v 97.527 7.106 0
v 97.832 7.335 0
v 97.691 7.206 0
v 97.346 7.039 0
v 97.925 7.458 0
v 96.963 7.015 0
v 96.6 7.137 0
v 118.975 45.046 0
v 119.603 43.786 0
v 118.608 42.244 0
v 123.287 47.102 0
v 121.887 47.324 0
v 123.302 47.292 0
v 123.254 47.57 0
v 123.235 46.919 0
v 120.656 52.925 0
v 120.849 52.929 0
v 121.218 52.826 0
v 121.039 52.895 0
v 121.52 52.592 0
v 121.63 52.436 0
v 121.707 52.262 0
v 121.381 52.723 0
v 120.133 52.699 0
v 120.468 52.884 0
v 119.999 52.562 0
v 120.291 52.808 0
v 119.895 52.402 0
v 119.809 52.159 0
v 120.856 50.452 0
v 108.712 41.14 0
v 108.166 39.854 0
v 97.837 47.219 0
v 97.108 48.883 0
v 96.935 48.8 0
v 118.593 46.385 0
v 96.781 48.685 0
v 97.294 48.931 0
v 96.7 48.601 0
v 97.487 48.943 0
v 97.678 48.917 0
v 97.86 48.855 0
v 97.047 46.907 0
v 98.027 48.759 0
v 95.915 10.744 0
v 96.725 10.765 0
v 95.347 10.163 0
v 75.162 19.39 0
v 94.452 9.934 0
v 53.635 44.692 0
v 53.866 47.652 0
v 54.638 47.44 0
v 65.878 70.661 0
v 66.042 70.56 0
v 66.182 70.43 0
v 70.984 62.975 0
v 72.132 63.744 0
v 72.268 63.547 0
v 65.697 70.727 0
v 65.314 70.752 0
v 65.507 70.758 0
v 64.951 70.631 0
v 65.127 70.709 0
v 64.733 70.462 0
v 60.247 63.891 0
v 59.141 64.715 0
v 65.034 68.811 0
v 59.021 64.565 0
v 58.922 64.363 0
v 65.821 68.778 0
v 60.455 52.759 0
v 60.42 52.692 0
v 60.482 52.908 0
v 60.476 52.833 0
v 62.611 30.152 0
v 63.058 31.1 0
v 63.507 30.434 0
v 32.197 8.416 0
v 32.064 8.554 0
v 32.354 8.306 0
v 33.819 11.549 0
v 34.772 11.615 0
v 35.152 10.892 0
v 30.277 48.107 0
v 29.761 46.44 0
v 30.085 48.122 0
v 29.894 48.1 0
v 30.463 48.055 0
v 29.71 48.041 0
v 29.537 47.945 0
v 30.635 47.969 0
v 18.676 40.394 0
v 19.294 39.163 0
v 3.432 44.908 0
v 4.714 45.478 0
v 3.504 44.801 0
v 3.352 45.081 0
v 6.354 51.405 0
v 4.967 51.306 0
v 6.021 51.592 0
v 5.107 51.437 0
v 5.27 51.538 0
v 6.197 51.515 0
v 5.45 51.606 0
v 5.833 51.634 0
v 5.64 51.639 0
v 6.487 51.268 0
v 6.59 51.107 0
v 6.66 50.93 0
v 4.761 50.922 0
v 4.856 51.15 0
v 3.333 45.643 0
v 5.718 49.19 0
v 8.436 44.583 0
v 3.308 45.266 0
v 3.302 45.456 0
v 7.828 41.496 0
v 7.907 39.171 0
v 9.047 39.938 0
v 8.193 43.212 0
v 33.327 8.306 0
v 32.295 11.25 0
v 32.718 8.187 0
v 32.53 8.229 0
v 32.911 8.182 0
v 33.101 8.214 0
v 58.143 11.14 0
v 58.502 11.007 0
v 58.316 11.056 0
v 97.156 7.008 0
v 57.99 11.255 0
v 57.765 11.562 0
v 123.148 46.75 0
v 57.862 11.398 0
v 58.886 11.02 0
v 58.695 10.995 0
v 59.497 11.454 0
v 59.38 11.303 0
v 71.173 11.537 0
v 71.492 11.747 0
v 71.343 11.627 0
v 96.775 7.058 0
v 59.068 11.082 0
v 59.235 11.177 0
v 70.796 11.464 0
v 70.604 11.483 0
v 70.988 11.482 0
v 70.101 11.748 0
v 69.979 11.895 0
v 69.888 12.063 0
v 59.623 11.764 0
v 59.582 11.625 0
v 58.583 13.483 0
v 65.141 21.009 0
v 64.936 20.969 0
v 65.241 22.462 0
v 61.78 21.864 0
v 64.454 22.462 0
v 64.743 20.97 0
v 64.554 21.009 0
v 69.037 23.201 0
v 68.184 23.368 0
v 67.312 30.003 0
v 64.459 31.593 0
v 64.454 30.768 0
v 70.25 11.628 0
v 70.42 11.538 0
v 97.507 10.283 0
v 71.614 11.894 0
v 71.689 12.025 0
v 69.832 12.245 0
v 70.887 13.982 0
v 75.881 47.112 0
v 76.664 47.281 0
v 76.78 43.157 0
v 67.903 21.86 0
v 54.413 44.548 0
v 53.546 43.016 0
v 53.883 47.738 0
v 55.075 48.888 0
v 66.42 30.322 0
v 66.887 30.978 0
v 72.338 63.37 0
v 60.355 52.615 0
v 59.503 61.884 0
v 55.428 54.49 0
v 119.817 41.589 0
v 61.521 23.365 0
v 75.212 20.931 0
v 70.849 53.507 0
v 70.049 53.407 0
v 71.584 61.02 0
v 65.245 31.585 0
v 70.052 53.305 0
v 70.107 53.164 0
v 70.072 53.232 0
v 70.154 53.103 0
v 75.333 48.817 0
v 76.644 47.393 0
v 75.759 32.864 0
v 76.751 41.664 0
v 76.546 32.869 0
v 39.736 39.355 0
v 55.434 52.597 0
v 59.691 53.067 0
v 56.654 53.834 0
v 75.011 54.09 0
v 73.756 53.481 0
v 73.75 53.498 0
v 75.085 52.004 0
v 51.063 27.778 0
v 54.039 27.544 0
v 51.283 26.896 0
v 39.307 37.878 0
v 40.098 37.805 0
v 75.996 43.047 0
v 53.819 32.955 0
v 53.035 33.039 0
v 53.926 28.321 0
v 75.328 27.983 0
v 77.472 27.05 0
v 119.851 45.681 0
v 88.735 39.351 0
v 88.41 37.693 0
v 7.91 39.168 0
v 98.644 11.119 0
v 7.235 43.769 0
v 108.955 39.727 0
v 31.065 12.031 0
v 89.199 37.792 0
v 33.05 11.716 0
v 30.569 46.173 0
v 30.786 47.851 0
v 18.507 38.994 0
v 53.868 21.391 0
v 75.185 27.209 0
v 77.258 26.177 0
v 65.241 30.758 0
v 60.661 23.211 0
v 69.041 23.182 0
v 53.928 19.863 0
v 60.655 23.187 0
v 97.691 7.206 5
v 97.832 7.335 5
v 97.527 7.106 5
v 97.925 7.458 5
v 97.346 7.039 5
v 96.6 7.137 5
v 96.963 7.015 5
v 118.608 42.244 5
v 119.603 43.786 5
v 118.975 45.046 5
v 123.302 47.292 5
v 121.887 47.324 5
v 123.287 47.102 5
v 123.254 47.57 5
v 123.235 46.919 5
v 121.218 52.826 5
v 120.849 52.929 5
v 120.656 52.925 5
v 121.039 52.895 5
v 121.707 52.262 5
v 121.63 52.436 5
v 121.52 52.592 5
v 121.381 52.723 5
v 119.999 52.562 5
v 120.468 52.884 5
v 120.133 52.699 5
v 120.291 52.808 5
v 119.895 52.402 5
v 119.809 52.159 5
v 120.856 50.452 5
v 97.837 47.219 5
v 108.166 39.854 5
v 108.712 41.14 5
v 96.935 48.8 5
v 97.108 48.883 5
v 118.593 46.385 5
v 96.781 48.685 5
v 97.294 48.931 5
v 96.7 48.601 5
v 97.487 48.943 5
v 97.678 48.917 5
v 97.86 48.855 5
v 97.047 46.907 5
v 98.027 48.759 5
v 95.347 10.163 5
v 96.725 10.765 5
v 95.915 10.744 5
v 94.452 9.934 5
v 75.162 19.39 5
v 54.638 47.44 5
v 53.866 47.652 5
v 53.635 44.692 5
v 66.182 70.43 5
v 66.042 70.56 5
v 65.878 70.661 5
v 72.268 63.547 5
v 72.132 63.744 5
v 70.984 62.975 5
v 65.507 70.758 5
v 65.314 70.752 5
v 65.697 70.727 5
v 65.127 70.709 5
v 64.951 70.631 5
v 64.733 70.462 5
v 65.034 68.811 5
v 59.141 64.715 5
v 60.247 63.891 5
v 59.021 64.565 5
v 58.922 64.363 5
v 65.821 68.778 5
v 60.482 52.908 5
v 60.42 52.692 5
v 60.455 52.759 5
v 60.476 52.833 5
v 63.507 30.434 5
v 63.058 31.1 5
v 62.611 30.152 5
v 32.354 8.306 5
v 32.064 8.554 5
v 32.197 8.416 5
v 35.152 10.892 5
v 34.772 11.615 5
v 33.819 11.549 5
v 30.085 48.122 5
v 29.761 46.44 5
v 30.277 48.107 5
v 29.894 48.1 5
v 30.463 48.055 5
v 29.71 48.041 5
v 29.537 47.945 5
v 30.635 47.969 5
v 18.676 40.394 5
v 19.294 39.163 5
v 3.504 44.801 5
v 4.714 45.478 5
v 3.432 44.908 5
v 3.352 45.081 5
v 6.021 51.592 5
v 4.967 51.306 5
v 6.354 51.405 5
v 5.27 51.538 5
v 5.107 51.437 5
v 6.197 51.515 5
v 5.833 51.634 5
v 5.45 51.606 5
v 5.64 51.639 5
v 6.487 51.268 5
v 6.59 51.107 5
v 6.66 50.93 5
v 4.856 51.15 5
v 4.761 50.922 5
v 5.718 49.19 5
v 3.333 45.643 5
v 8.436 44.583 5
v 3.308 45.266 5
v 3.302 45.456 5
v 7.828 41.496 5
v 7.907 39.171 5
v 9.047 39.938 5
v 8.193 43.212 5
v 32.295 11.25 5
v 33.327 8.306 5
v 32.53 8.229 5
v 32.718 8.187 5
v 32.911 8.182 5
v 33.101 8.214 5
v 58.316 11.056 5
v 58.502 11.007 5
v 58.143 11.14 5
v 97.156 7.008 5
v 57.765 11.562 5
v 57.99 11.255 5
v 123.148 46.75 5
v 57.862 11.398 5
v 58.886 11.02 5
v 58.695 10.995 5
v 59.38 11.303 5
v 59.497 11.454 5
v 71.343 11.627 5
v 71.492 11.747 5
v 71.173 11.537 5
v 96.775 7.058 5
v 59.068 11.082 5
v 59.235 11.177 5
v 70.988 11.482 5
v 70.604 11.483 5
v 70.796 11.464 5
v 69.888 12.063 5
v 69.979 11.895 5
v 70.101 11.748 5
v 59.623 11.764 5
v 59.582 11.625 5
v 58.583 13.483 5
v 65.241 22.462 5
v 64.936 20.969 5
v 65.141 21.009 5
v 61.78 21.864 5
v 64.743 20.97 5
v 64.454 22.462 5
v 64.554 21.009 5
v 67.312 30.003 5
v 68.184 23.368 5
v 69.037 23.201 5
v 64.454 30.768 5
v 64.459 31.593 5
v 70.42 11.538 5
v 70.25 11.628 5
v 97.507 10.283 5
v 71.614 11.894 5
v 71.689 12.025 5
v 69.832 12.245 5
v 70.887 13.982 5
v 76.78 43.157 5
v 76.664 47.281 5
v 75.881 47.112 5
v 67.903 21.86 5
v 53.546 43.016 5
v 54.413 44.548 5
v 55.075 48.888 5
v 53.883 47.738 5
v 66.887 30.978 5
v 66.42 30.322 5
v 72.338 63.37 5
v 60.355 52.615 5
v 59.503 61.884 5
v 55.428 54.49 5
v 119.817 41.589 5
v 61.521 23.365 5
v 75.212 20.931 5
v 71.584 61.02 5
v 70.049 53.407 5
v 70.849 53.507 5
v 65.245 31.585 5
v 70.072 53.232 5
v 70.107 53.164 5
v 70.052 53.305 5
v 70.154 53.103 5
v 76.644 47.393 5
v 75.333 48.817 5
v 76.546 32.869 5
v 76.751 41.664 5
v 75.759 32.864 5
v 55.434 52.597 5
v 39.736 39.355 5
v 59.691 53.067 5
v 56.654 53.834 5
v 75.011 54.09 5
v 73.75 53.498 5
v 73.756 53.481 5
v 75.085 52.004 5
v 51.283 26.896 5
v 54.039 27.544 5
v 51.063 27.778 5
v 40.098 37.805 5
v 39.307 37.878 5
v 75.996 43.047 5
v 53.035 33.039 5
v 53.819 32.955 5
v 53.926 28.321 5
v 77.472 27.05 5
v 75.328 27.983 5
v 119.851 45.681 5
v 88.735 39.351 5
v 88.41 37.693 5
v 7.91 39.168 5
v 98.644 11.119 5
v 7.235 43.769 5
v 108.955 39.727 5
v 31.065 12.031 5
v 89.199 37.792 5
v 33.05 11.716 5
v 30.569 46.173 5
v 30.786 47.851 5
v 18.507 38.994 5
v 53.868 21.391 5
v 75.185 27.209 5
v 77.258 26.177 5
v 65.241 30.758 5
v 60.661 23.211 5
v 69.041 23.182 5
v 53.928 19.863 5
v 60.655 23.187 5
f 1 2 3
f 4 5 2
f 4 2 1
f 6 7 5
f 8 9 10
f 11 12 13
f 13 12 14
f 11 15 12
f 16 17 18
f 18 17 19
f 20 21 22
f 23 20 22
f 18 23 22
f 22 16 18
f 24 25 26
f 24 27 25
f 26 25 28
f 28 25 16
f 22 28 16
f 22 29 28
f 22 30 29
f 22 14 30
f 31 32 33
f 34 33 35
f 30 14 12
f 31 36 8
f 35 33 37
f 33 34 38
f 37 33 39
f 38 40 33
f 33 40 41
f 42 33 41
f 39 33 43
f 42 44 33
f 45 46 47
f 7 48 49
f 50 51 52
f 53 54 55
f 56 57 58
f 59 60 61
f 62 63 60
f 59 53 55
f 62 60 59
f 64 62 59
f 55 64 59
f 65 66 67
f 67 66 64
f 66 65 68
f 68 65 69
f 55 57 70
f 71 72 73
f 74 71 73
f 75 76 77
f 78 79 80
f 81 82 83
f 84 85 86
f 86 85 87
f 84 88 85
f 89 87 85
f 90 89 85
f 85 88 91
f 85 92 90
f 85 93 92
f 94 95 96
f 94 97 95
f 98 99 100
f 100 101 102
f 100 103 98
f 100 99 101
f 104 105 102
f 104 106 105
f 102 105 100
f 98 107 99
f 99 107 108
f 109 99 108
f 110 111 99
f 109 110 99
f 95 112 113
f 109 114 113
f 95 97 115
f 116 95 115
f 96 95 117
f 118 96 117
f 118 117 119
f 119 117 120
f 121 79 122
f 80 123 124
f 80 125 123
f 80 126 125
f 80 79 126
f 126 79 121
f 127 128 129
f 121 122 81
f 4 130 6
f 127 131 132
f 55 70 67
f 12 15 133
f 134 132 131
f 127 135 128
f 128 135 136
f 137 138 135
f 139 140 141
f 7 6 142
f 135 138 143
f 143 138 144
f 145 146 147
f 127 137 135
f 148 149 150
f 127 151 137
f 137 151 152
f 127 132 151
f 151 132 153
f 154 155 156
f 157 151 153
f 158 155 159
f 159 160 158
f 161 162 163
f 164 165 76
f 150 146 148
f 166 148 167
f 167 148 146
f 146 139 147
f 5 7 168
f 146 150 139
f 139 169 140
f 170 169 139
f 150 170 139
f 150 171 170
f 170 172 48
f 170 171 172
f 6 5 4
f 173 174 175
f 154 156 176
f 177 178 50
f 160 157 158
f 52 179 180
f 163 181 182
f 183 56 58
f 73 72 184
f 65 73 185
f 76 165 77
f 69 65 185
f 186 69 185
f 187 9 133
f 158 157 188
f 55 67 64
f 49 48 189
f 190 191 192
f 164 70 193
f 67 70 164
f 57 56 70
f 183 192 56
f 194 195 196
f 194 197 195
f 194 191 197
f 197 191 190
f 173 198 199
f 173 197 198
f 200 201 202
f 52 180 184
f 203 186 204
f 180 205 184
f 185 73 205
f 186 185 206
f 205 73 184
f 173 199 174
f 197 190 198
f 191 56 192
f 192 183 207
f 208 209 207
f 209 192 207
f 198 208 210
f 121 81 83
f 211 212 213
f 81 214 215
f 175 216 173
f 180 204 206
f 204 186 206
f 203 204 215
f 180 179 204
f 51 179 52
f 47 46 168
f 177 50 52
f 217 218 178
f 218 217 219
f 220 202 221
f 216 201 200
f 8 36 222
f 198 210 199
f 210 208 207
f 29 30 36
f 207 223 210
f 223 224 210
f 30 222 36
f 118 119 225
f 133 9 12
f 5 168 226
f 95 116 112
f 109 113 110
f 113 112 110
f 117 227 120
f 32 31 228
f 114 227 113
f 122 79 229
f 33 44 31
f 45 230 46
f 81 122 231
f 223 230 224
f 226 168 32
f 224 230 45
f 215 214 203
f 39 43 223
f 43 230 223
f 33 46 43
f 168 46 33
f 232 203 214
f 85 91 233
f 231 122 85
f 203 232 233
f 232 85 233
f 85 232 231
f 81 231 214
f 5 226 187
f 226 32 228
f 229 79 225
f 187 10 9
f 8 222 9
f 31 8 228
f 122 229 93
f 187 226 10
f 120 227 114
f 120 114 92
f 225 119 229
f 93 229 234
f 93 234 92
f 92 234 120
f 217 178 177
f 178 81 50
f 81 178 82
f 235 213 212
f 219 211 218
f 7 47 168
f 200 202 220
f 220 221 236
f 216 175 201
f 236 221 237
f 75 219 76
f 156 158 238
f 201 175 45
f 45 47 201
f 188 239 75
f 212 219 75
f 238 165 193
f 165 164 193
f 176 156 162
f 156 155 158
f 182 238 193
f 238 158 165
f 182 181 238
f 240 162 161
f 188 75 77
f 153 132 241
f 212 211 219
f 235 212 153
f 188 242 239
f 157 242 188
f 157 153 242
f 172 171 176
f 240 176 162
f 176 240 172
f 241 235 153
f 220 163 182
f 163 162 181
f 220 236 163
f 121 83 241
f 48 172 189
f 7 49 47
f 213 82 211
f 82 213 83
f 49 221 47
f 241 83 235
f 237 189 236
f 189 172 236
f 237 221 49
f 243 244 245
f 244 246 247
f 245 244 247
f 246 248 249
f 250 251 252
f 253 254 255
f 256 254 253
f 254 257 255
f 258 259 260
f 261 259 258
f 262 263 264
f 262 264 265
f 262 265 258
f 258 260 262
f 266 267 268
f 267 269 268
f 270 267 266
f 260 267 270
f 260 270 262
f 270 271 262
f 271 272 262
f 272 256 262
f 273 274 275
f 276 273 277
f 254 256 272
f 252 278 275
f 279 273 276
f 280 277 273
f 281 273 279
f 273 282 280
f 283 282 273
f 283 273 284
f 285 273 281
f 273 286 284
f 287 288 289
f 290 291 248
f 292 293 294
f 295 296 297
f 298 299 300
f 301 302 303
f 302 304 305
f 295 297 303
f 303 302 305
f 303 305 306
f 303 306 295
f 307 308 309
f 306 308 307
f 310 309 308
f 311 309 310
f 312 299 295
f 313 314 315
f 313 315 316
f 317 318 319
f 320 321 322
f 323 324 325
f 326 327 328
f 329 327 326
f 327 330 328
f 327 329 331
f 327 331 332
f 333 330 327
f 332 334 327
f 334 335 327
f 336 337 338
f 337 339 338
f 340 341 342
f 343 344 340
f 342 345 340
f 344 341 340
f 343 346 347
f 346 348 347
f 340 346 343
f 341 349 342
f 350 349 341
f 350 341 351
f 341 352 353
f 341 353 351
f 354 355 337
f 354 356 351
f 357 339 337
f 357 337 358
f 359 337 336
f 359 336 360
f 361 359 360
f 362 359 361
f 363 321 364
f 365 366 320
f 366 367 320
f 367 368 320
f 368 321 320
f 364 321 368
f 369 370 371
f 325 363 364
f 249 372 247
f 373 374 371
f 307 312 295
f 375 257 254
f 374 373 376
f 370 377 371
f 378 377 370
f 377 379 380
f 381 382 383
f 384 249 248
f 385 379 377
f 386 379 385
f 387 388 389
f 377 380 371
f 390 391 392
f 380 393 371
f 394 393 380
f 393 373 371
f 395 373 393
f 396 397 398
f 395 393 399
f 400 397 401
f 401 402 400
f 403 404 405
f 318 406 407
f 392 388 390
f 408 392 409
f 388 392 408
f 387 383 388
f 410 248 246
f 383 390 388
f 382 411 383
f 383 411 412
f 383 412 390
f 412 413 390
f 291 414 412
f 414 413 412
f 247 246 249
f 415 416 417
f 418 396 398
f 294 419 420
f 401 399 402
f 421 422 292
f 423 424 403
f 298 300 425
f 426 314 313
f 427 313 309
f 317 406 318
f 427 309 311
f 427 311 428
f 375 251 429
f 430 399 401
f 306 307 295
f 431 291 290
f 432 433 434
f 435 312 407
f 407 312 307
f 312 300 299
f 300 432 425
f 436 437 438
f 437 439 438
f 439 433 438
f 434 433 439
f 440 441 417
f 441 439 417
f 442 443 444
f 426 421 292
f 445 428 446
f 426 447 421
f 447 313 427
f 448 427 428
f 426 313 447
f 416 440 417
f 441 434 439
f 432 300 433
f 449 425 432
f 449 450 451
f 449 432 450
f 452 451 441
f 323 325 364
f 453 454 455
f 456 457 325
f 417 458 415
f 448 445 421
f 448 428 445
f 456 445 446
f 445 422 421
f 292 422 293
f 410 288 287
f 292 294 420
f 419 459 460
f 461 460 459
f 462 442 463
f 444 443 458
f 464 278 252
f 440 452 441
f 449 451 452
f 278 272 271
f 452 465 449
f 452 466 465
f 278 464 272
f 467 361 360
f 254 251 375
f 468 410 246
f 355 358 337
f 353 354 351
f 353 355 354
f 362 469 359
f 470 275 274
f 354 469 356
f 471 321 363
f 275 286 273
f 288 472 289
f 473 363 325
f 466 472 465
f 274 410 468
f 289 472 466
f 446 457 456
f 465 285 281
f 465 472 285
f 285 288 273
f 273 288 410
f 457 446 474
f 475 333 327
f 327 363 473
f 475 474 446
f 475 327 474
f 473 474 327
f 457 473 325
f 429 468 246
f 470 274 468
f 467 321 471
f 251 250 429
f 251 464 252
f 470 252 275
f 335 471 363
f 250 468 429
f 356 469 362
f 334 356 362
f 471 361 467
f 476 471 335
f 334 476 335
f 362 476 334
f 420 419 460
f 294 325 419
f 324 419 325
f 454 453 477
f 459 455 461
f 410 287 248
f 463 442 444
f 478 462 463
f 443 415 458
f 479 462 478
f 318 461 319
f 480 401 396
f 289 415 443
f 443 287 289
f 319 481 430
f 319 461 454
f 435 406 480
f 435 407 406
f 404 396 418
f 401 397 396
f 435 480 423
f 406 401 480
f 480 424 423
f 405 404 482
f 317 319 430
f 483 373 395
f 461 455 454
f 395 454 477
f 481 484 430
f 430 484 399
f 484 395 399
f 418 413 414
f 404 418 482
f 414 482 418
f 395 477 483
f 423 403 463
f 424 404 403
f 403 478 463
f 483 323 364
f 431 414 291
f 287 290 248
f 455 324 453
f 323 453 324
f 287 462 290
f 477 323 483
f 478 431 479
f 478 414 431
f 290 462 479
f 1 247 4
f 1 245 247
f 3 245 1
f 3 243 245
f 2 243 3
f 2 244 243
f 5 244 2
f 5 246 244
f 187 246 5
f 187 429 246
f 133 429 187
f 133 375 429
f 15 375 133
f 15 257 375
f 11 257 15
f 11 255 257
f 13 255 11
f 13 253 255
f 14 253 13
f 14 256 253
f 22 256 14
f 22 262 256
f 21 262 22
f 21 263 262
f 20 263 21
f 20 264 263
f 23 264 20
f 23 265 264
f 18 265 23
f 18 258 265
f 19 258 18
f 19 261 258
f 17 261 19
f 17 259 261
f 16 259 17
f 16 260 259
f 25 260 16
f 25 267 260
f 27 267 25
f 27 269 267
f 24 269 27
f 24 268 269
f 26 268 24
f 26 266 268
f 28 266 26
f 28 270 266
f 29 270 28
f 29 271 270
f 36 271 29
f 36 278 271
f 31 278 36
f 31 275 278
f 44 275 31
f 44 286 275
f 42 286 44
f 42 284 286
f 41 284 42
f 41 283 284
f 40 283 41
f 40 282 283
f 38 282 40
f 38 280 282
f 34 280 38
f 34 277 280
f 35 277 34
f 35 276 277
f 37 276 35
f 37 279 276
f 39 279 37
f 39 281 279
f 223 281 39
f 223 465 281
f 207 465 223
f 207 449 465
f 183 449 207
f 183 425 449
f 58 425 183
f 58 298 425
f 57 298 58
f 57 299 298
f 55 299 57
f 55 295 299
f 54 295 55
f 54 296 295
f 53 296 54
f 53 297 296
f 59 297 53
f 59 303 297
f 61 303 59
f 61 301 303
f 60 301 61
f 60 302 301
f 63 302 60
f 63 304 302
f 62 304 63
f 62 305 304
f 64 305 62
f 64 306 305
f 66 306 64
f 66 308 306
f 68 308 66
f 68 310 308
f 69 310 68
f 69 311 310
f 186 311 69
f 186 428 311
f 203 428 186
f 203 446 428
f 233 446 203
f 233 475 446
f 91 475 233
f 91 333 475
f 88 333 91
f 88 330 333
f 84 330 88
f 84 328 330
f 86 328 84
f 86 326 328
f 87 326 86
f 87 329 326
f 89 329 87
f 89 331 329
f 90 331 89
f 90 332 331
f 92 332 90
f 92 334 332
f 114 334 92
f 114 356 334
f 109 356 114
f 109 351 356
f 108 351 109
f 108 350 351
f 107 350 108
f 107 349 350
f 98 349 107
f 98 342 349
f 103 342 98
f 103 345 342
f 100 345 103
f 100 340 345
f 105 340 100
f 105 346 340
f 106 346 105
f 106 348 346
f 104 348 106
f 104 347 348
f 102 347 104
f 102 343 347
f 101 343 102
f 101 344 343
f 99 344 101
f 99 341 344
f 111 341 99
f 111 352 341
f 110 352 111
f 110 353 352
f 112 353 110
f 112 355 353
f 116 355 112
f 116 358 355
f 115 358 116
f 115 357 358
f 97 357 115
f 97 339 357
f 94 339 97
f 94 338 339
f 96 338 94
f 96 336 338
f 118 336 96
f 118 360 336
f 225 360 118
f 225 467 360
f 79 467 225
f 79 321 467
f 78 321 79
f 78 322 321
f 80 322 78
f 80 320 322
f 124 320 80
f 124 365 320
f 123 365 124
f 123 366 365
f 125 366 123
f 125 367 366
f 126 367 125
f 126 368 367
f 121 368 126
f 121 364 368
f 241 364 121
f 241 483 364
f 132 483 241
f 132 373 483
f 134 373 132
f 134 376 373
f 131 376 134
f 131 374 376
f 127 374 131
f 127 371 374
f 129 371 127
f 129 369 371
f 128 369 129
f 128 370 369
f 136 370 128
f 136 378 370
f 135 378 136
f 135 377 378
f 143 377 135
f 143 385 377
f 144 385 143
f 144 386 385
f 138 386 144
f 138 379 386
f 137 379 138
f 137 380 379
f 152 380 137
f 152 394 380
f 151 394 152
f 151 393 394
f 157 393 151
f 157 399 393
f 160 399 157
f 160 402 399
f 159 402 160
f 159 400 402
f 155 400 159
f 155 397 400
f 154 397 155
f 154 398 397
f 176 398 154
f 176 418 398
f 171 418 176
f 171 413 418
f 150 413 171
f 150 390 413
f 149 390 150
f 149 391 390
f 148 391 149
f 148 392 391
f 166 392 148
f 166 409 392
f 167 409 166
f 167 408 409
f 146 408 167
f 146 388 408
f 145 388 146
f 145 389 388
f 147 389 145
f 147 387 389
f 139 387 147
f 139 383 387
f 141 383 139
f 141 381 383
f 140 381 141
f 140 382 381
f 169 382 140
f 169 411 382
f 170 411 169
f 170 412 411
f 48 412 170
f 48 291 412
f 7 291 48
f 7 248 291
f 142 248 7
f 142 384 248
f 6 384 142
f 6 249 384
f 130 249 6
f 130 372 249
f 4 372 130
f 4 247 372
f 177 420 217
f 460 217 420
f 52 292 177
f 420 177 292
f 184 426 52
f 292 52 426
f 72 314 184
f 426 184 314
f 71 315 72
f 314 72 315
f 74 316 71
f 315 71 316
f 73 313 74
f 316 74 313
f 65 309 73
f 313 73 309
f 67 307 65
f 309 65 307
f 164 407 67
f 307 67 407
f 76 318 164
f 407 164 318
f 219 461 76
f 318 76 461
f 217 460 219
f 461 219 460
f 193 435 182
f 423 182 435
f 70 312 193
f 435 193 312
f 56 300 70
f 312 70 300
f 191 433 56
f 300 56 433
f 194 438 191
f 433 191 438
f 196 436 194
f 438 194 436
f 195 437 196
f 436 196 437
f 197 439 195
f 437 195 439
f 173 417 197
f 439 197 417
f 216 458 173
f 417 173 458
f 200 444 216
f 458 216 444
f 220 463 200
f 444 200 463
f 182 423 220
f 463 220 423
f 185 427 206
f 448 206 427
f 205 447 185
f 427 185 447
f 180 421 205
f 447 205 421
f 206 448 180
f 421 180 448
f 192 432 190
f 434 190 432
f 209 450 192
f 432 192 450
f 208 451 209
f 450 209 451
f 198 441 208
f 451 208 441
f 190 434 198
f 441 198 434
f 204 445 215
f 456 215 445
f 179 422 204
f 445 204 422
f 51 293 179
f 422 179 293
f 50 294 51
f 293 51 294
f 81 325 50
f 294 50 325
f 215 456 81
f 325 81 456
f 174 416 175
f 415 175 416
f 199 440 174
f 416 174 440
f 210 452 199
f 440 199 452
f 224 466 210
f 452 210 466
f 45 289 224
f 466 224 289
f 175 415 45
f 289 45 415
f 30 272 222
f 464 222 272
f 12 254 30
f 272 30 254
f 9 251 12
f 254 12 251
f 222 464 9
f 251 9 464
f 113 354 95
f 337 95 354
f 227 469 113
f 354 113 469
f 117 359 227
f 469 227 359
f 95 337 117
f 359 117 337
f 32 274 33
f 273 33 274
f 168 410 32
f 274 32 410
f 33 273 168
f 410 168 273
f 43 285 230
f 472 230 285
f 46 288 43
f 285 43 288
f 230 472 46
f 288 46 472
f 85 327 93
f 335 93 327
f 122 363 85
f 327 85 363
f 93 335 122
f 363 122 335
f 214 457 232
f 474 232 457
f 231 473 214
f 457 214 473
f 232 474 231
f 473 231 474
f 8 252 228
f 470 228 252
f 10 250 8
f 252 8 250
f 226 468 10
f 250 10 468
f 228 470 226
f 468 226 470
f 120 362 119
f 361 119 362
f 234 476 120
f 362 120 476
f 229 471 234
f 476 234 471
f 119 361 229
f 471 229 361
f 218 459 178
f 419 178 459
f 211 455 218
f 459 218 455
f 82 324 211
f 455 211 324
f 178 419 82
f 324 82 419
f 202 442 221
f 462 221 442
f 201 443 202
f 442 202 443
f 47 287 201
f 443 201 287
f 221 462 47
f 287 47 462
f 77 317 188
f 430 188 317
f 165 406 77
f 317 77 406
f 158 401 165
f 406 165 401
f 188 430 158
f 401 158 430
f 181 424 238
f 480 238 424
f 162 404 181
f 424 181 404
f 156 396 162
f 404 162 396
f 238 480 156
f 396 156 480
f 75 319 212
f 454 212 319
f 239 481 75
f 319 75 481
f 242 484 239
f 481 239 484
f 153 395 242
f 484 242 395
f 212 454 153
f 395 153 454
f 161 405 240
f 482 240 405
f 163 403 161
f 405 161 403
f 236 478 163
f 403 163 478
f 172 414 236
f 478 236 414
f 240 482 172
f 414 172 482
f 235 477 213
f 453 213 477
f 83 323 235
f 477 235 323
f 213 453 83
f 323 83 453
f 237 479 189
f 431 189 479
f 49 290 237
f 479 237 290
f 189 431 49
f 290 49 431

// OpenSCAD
/*
 * Customizable Origami - Bat - https://www.thingiverse.com/thing:2686150
 * by Dennis Hofmann - https://www.thingiverse.com/mightynozzle/about
 * created 2017-12-03
 * version v1.0
 *
 * Changelog
 * --------------
 * v1.0:
 *      - final design
 * --------------
 * 
 * This work is licensed under the Creative Commons - Attribution - NonCommercial - ShareAlike license.
 * https://creativecommons.org/licenses/by-nc-sa/3.0/
 */


 // Parameter Section //
//-------------------//

// preview[view:north, tilt:top]

// The maximum size of the longest side. The shorter side will be automatically resized in same ratio.
max_size_in_millimeter = 120; //[20:300]

// The height of the model.
model_height_in_millimeter = 5; //[0.2:0.2:100]

// Thickness of the outer outline.
outline_size_in_millimeter = 1.4; //[0.5:0.1:20]

// Thickness of the inner outline.
inline_size_in_millimeter = 0.8; //[0.5:0.1:20]

// Roundiness of the ends of the inner outlines.
inline_edge_radius_in_millimeter = 0.0; //[0.0:0.1:5]

// Flip model
flip_model = "no"; //[yes,no]

/*[hidden]*/
max_size = max_size_in_millimeter;
model_height = model_height_in_millimeter;
$fn=32;

// Outer Points
A1 = [48, 432];
A2 = [36, 387];
A3 = [73, 339];
A4 = [276, 78];
A5 = [457, 181];
A6 = [493, 102];
A7 = [513, 197];
A8 = [545, 187];
A9 = [577, 197];
A10 = [595, 106];
A11 = [628, 177];
A12 = [816, 68];
A13 = [1000, 359];
A14 = [1028, 403];
A15 = [1015, 443];
A16 = [1004, 390];
A17 = [913, 341];
A18 = [819, 409];
A19 = [746, 323];
A20 = [623, 457];
A21 = [600, 538];
A22 = [550, 595];
A23 = [503, 546];
A24 = [473, 460];
A25 = [334, 324];
A26 = [253, 402];
A27 = [158, 335];
A28 = [64, 374];

outline = [A1, A2, A3, A4, A5, A6, A7, A8, A9, A10, A11, A12, A13, A14, A15, A16, A17, A18, A19, A20, A21, A22, A23, A24, A25, A26, A27, A28];

// Inner Points
B1 = [531, 262];
B2 = [545, 267];
B3 = [561, 261];
B4 = [546, 324];
B5 = [449, 281];
B6 = [432, 235];
B7 = [450, 237];
B8 = [636, 234];
B9 = [648, 229];
B10 = [640, 280];
B11 = [456, 406];
B12 = [505, 451];
B13 = [592, 455];
B14 = [641, 403];
B15 = [642, 367];
B16 = [454, 380];

// Polygons
C1 = [A1, A2, A3, A28];
C2 = [A3, A4, A27, A28];
C3 = [A4, A26, A27];
C4 = [A4, A25, A26];
C5 = [A4, A25, A24, B11, B16];
C6 = [B16, B5, B6, A4];
C7 = [A4, B6, A5];
C8 = [A6, B7, B5, B6, A5];
C9 = [A6, A7, B1, B7];
C10 = [A7, A8, B2, B1];
C11 = [A8, A9, B3, B2];
C12 = [A10, B8, B3, A9];
C13 = [A10, A11, B9, B10, B8];
C14 = [A11, A12, B9];
C15 = [A12, B15, B10, B9];
C16 = [A12, A19, A20, B14, B15];
C17 = [A12, A18, A19];
C18 = [A12, A17, A18];
C19 = [A12, A13, A16, A17];
C20 = [A13, A16, A15, A14];
C21 = [B11, B12, A23, A24];
C22 = [B13, B14, A20, A21];
C23 = [B2, B3, B8, B10, B15, B14, B13, A21, A22];
C24 = [A22, A23, B12, B11, B16, B5, B7, B1, B2];

cut_polygons = [C1, C2, C3, C4, C5, C6, C7, /*C8,*/ C9, C10, C11, C12, /*C13,*/ C14, C15, C16, C17, C18, C19, C20, C21, C22, C23, C24];

min_x = A2[0];
min_y = A12[1];
max_x = A14[0];
max_y = A22[1];

x_size = max_x - min_x;
y_size = max_y - min_y;

x_factor = max_size / x_size;
y_factor = max_size / y_size;

inline_size = x_size > y_size ? inline_size_in_millimeter / x_factor / 2: inline_size_in_millimeter / y_factor / 2;
inline_edge_radius = x_size > y_size ? inline_edge_radius_in_millimeter / x_factor: inline_edge_radius_in_millimeter / y_factor;
outline_size = x_size > y_size ? outline_size_in_millimeter / x_factor - inline_size: outline_size_in_millimeter / y_factor - inline_size;


 // Program Section //
//-----------------//

if(x_size > y_size) {
    resize(newsize=[max_size, x_factor * y_size, model_height]){
        if(flip_model == "yes") {
            mirror([0,1,0]) {
                rotate([180,180,0]) {    
                    create(outline, cut_polygons);
                }
            }
        } else {
            create(outline, cut_polygons);
        }
    }
} else {
    resize(newsize=[y_factor * x_size, max_size, model_height]){
        if(flip_model == "yes") {
            mirror([0,1,0]) {
                rotate([180,180,0]) {    
                    create(outline, cut_polygons);
                }
            }
        } else {
            create(outline, cut_polygons);
        }
    }
}


 // Module Section //
//----------------//

module create() {
    linear_extrude(height=1) {
        difference() {
            offset(r = -0) {
                offset(r = +outline_size) {
                    polygon(points = outline, convexity = 10);
                }
            }
            
            for(cut_polygon = [0:len(cut_polygons)]) {
                offset(r = +inline_edge_radius) {
                    offset(r = -inline_size - inline_edge_radius) {
                        polygon(points = cut_polygons[cut_polygon], convexity = 10);
                    }
                }
            }
        }
    }
}
